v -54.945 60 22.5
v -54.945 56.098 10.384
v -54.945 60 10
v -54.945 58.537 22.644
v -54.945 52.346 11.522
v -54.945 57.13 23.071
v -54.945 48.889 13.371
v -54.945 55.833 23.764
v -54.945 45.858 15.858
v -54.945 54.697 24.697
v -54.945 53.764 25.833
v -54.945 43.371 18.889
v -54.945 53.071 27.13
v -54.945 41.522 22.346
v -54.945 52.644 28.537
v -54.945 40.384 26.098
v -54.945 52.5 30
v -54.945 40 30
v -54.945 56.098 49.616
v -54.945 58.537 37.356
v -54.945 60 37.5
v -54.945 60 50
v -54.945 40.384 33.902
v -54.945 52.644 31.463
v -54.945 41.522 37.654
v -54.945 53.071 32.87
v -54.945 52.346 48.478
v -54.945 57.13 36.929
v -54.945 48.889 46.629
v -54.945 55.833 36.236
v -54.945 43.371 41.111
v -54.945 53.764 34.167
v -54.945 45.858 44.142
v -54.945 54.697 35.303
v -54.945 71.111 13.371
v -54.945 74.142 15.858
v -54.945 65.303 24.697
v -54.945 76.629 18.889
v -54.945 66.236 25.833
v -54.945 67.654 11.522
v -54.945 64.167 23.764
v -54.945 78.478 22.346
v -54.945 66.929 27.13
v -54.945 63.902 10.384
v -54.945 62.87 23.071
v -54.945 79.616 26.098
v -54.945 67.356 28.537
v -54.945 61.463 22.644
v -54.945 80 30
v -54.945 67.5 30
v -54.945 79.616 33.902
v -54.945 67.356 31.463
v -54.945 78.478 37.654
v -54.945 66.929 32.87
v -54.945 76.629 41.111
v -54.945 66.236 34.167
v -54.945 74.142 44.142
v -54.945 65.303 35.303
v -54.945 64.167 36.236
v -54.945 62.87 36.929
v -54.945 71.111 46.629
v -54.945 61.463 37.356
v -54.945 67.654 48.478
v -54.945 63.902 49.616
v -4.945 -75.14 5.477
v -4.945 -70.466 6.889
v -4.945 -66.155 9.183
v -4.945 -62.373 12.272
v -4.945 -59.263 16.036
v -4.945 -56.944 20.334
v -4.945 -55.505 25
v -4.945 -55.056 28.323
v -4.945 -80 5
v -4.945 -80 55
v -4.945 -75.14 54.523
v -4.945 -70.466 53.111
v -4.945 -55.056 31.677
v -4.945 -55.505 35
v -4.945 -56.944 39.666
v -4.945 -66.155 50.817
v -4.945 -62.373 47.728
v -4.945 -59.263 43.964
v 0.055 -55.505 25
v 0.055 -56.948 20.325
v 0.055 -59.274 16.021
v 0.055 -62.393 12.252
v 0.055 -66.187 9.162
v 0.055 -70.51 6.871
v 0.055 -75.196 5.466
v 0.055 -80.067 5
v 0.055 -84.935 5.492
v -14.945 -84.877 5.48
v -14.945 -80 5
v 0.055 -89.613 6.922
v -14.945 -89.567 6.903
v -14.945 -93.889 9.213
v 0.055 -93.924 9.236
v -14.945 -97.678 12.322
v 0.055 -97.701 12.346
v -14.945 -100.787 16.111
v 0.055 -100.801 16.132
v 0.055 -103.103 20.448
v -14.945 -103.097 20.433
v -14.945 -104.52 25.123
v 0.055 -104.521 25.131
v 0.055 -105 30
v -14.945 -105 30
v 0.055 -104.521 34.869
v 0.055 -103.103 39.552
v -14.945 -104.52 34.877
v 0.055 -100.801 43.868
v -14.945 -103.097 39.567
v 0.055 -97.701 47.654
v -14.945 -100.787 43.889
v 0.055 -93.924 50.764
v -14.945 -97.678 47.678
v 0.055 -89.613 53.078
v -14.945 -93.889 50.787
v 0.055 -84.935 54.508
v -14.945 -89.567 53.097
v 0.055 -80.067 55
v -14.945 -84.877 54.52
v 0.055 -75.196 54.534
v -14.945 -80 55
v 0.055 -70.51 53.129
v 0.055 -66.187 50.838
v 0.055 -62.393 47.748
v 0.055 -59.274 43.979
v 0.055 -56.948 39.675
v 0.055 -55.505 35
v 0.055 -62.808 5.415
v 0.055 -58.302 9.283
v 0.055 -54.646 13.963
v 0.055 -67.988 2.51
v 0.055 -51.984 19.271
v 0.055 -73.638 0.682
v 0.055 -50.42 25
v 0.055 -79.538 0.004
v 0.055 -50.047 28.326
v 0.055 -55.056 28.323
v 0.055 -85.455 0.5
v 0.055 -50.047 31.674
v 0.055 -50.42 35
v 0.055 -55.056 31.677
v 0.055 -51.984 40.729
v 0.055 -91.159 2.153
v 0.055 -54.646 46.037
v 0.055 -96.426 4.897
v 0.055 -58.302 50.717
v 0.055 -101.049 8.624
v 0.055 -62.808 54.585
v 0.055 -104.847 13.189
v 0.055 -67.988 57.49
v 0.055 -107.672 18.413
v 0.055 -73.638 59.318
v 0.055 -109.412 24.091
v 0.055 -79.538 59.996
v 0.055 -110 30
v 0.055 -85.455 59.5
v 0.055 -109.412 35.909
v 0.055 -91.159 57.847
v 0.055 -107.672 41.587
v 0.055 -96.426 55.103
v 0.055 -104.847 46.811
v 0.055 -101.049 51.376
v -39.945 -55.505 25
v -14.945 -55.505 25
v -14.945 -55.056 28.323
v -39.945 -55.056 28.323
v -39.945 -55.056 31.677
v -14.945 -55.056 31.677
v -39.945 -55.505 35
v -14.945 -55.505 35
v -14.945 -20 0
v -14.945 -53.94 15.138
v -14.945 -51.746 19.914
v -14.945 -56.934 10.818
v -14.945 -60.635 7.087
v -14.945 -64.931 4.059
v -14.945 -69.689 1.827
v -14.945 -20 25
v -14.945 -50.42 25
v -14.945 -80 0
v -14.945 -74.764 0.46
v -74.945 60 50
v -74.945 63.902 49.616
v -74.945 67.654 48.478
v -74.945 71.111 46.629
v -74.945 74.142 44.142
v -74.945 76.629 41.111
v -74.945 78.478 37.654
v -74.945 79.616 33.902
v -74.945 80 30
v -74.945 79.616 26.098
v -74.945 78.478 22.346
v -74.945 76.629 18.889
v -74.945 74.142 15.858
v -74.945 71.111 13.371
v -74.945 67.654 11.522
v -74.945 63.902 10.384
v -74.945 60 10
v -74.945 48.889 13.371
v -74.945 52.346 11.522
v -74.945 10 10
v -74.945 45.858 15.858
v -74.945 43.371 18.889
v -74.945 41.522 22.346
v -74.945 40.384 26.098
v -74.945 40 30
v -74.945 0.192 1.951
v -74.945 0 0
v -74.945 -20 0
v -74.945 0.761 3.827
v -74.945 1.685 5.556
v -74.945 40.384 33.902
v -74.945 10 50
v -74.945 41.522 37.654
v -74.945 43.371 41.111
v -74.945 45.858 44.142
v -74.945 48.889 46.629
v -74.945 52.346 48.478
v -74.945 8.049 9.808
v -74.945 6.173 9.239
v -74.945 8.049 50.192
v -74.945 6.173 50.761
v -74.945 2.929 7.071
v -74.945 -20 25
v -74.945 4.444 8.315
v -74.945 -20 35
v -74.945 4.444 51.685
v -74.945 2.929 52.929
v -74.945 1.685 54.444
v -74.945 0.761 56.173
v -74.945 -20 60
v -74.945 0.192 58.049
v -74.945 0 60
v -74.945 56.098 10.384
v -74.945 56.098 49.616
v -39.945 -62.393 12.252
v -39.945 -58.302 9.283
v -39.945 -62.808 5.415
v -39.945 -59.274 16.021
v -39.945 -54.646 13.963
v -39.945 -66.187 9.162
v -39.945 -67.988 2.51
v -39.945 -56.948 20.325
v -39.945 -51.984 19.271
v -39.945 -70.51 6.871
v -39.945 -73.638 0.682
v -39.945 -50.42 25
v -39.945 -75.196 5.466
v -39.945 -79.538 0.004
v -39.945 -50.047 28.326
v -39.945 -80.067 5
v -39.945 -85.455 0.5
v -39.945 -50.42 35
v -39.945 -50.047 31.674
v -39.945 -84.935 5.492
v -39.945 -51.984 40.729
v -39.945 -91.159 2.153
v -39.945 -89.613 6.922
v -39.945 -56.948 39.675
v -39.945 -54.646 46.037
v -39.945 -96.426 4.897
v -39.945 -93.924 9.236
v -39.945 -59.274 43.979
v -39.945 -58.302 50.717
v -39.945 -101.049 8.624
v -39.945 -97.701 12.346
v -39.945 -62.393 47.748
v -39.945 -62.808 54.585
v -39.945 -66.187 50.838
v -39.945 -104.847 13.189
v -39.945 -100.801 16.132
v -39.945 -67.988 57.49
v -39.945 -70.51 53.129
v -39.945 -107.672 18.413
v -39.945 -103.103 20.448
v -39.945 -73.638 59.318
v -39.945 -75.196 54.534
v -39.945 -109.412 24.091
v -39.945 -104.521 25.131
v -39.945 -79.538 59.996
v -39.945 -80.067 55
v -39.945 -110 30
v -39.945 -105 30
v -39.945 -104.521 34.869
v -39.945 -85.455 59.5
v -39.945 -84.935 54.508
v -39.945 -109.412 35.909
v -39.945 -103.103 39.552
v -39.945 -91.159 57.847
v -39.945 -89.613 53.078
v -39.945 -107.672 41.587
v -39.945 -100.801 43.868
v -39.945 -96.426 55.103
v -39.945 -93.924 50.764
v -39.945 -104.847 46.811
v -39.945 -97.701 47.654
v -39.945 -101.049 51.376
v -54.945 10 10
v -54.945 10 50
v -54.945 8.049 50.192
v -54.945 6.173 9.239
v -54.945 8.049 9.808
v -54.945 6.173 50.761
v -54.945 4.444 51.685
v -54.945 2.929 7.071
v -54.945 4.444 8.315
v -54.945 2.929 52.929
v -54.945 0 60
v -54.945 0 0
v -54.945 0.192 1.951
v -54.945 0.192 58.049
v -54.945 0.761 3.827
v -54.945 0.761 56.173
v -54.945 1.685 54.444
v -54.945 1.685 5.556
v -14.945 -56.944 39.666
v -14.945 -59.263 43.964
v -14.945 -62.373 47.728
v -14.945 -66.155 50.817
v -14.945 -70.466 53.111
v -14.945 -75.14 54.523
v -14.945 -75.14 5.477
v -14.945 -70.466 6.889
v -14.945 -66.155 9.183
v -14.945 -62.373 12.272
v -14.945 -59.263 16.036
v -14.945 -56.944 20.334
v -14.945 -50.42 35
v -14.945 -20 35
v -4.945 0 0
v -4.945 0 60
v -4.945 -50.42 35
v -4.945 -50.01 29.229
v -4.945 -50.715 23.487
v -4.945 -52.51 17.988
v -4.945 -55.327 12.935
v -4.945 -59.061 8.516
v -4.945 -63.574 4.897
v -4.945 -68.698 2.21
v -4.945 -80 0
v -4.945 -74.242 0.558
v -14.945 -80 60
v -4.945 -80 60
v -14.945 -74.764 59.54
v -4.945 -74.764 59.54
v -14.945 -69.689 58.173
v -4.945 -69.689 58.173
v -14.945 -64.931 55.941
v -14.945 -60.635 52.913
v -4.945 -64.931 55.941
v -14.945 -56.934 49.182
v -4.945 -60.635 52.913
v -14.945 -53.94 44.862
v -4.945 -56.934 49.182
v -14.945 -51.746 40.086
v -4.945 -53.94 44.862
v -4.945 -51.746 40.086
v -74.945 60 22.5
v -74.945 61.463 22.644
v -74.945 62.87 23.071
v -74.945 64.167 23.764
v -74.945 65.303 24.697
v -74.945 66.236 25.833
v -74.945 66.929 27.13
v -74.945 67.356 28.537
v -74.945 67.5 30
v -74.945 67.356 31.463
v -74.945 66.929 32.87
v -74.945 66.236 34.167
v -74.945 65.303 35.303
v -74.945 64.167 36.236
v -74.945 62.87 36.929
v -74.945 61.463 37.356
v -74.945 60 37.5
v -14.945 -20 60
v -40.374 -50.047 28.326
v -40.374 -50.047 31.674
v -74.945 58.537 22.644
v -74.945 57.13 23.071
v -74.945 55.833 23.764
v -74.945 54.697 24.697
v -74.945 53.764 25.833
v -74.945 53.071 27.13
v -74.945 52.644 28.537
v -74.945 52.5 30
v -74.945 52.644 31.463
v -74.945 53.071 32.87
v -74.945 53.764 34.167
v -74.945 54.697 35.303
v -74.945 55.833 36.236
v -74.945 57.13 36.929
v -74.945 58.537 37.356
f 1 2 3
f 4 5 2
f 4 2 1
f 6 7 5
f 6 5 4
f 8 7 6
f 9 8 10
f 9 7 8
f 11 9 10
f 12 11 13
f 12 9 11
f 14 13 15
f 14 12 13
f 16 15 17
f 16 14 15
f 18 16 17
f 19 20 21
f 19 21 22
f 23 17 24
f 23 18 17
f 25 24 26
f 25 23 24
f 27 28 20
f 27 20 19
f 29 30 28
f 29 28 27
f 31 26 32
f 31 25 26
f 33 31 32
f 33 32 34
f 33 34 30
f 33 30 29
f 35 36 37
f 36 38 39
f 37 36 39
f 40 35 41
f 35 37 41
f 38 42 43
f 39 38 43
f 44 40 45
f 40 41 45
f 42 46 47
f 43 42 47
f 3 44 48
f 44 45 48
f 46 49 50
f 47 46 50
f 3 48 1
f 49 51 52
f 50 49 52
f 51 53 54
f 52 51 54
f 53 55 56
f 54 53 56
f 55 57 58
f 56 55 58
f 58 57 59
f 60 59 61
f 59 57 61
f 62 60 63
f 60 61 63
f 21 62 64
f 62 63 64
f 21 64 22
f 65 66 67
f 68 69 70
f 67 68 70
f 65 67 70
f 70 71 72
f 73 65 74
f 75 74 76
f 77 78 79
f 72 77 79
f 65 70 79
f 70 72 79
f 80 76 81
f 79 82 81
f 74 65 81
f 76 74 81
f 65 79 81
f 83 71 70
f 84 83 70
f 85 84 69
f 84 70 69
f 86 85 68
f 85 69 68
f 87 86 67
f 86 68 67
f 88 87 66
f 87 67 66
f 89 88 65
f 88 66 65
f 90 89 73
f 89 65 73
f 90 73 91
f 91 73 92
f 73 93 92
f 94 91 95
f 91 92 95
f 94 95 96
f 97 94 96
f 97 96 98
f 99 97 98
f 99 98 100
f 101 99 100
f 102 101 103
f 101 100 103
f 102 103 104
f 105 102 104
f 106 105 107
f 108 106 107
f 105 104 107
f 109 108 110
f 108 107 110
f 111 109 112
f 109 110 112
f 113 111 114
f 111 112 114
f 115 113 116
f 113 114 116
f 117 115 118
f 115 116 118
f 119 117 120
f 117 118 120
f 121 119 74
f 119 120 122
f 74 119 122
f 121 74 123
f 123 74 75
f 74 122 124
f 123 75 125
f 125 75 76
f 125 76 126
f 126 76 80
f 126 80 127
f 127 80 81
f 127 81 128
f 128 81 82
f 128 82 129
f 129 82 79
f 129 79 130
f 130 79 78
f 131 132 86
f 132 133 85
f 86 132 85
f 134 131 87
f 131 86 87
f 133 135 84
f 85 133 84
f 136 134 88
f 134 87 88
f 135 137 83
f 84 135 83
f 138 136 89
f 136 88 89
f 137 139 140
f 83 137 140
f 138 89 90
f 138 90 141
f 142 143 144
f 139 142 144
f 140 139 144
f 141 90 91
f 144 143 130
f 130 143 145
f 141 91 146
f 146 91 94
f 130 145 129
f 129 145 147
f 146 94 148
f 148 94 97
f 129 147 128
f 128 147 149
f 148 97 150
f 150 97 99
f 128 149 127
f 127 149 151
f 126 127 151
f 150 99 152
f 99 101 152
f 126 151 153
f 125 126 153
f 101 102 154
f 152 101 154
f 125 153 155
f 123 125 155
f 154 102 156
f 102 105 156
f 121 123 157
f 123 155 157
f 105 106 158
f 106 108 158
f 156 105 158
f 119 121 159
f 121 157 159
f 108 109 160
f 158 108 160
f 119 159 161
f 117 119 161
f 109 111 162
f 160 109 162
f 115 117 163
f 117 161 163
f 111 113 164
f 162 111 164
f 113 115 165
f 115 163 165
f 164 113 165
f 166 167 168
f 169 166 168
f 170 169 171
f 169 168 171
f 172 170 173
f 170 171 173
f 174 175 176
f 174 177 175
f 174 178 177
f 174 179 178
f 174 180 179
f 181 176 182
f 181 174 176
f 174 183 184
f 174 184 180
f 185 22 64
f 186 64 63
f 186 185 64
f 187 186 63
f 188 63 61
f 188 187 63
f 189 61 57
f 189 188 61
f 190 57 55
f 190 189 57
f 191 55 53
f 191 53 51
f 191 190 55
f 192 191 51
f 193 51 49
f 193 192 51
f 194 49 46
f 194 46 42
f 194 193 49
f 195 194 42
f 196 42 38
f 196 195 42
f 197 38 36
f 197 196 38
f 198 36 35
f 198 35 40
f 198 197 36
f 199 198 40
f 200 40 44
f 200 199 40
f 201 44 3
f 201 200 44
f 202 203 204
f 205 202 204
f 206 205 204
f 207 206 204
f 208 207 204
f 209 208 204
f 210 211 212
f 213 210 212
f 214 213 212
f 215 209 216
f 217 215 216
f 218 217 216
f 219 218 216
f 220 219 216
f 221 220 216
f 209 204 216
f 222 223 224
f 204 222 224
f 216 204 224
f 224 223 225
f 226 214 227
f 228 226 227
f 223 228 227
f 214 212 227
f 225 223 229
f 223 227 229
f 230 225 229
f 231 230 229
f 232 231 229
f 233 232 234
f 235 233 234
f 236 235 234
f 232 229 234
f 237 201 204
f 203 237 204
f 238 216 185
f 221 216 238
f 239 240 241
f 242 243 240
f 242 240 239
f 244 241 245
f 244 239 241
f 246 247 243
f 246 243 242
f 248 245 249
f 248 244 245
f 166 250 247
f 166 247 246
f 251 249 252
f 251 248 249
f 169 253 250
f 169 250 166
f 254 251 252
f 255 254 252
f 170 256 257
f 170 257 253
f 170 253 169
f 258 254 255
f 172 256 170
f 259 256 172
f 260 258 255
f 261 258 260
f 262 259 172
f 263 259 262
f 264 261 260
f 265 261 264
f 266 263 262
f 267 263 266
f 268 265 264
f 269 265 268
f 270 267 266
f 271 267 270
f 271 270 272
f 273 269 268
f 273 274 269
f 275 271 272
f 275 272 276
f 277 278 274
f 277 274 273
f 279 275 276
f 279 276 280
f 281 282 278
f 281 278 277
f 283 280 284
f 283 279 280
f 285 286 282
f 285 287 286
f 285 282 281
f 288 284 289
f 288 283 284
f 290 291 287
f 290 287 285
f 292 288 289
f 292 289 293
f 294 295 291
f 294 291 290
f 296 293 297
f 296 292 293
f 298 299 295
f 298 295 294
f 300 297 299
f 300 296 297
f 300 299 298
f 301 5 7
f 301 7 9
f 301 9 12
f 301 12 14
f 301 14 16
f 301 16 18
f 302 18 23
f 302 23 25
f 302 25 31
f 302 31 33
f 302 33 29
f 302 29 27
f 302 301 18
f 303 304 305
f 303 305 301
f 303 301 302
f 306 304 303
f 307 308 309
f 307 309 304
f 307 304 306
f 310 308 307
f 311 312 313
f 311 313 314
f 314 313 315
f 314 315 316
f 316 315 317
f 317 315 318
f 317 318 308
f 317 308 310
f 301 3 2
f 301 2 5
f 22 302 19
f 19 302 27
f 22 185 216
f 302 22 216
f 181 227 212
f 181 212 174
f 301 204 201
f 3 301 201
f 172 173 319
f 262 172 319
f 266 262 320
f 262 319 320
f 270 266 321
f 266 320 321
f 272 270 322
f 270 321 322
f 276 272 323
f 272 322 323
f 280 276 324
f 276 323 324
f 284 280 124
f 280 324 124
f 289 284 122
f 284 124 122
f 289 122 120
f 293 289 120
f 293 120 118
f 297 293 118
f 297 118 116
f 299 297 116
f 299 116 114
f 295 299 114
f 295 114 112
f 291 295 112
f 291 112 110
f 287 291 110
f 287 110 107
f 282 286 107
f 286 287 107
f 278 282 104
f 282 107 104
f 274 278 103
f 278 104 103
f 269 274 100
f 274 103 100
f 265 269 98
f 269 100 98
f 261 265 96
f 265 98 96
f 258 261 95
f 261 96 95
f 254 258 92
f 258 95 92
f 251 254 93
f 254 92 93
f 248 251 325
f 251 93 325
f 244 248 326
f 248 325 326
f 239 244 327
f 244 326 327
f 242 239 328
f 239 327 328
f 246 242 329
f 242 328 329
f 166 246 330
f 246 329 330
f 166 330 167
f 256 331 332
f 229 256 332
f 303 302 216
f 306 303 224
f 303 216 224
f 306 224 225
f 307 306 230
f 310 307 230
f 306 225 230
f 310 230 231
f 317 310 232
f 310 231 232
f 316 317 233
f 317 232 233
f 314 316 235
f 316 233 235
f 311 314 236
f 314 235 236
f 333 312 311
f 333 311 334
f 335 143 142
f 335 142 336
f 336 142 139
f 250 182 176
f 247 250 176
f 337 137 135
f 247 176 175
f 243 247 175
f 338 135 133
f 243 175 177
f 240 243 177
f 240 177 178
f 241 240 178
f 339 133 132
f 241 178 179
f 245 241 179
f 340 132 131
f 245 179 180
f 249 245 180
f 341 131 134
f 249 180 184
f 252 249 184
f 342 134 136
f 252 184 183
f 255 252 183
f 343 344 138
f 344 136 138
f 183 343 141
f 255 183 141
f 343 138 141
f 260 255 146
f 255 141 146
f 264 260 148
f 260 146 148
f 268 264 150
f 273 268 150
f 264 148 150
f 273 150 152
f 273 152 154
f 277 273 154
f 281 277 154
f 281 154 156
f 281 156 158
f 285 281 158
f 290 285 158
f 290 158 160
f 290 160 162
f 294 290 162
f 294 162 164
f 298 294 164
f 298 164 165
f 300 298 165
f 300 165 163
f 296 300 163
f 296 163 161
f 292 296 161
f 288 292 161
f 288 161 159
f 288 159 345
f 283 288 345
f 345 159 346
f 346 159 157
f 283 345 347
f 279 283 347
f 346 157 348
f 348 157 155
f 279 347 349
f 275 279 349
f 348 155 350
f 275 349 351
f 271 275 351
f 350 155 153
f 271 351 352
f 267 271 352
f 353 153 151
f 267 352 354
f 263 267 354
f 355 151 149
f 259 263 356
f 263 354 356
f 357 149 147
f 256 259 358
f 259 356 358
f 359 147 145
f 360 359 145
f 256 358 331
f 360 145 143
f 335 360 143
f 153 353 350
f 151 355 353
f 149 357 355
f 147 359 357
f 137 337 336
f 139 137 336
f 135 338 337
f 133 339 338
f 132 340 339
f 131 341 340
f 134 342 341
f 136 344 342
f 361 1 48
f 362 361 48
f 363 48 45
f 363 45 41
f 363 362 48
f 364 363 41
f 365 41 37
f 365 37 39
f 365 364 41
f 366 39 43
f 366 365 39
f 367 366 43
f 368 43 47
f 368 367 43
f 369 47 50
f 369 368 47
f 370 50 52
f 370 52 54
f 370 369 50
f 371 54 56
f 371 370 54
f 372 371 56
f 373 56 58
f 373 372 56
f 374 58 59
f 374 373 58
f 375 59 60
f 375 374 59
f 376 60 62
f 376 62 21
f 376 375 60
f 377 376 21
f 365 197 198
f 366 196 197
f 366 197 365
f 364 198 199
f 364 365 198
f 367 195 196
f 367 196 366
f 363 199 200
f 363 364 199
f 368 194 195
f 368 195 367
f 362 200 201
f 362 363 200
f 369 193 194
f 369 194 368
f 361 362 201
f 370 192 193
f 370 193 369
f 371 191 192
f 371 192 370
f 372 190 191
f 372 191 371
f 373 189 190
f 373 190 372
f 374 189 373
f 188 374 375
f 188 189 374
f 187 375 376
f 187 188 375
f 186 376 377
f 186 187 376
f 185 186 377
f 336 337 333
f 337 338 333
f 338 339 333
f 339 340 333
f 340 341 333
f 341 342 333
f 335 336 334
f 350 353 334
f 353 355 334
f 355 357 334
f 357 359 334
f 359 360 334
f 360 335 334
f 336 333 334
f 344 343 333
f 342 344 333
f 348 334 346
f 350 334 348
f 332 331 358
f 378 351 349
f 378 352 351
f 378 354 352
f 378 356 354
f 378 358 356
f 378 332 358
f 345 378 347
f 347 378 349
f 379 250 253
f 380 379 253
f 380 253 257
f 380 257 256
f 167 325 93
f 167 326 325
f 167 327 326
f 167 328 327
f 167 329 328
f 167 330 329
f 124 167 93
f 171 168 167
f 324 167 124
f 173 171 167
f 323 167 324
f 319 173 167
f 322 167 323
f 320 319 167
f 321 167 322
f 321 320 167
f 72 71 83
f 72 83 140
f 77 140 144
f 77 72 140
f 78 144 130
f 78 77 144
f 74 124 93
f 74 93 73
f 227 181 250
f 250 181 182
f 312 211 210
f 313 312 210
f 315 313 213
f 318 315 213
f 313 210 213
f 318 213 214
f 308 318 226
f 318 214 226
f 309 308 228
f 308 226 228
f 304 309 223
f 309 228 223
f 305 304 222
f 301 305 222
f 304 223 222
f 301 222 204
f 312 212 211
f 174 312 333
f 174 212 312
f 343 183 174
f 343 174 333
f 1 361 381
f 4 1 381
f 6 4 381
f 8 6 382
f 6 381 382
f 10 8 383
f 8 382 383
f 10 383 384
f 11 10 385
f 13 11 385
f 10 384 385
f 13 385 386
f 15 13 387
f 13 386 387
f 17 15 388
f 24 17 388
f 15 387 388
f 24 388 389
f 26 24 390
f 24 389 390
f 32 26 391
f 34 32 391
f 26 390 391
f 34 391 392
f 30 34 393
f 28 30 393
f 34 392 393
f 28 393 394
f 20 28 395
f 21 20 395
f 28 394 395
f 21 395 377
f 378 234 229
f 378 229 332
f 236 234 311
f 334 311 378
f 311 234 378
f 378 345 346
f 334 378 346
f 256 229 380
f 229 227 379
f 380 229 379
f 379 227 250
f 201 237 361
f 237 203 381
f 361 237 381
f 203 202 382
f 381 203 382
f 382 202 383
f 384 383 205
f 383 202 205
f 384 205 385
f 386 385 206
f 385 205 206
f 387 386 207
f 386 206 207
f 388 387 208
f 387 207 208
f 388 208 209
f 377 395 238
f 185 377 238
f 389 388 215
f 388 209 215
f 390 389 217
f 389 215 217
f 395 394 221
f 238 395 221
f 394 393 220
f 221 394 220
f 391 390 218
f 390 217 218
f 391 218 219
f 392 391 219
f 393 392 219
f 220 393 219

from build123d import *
from build123d import SkipClean  # not in build123d's __all__

# Parameters (mm, degrees)
F0_W      = 70
F0_H      = 60
F8_DEPTH  = 20
F1_W      = 10
F1_H      = 60
F9_DEPTH  = 60
F10_DEPTH = 25
F3_DEPTH  = 40
F4_DEPTH  = 60
F11_DEPTH = 109.889773652
F6_W      = 20
F6_H      = 60
F12_DEPTH = 60
F14_DEPTH = 25
F7_DEPTH  = 20


with BuildPart() as f8:
    # F0 (on Front) → F8 (new body)
    with BuildSketch(Plane.XZ):
        with Locations((-39.945468749, 30)):
            Rectangle(F0_W, F0_H)
    extrude(amount=F8_DEPTH)

    # F1 (on face) → F9 (join)
    with BuildSketch(Plane.XZ.offset(20)):
        with Locations((-9.945468749, 30)):
            Rectangle(F1_W, F1_H)
    extrude(amount=F9_DEPTH)

    # F2 (on face) → F10 (join)
    with BuildSketch(Plane(origin=(-14.945468749, 0, 0), x_dir=(0, -1, 0), z_dir=(-1, 0, 0))):
        with BuildLine():
            Line((55.5051025722, 35), (50.4196010845, 35))
            ThreePointArc((50.4196010845, 35), (50, 30), (50.4196010845, 25))
            Line((50.4196010845, 25), (55.5051025722, 25))
            ThreePointArc((55.5051025722, 25), (55, 30), (55.5051025722, 35))
        make_face()
        with BuildLine():
            Line((55.5051025722, 25), (50.4196010845, 25))
            ThreePointArc((50.4196010845, 25), (60.635083269, 7.0871215252), (80, 0))
            Line((80, 0), (80, 5))
            ThreePointArc((80, 5), (64.1886116992, 10.635083269), (55.5051025722, 25))
        make_face()
        with BuildLine():
            ThreePointArc((80, 60), (60.635083269, 52.9128784748), (50.4196010845, 35))
            Line((50.4196010845, 35), (55.5051025722, 35))
            ThreePointArc((55.5051025722, 35), (64.1886116992, 49.364916731), (80, 55))
            Line((80, 55), (80, 60))
        make_face()
        with BuildLine():
            ThreePointArc((110, 30), (101.2132034356, 51.2132034356), (80, 60))
            Line((80, 60), (80, 55))
            ThreePointArc((80, 55), (97.6776695297, 47.6776695297), (105, 30))
            ThreePointArc((105, 30), (97.6776695297, 12.3223304703), (80, 5))
            Line((80, 5), (80, 0))
            ThreePointArc((80, 0), (101.2132034356, 8.7867965644), (110, 30))
        make_face()
    extrude(amount=F10_DEPTH)

    # F3 (add): a face of the model
    f3_faces = [f8.faces().sort_by_distance(p)[0] for p in [
        (-39.945468749, -80, 4.1514718626),
    ]]
    extrude(f3_faces, amount=-F3_DEPTH)

    # F2 (on face) → F4 (join)
    with BuildSketch(Plane(origin=(-14.945468749, 0, 0), x_dir=(0, -1, 0), z_dir=(-1, 0, 0))):
        with BuildLine():
            Line((50.4196010845, 35), (20, 35))
            Line((20, 35), (20, 25))
            Line((20, 25), (50.4196010845, 25))
            ThreePointArc((50.4196010845, 25), (50, 30), (50.4196010845, 35))
        make_face()
    extrude(amount=F4_DEPTH)

    # F5 (on face) → F11 (cut)
    with BuildSketch(Plane(origin=(0, 0, 25), x_dir=(1, 0, 0), z_dir=(0, 0, -1))):
        Polygon((-74.945468749, 50.4196010845), (-74.945468749, 20), (-39.945468749, 50.4196010845), align=None)
    extrude(amount=-F11_DEPTH, mode=Mode.SUBTRACT)

    # F6 (on face) → F12 (join)
    with BuildSketch(Plane.XZ):
        with Locations((-64.945468749, 30)):
            Rectangle(F6_W, F6_H)
    extrude(amount=-F12_DEPTH)

    # F13 (on face) → F14 (cut)
    with BuildSketch(Plane(origin=(-74.945468749, 0, 0), x_dir=(0, -1, 0), z_dir=(-1, 0, 0))):
        with BuildLine():
            Line((0, 60), (-20, 60))
            ThreePointArc((-20, 60), (-17.0710678119, 52.9289321881), (-10, 50))
            ThreePointArc((-10, 50), (-2.9289321881, 52.9289321881), (0, 60))
        make_face()
        with BuildLine():
            Line((-10, 10), (-60, 10))
            Line((-60, 10), (-60, 0))
            Line((-60, 0), (-20, 0))
            ThreePointArc((-20, 0), (-17.0710678119, 7.0710678119), (-10, 10))
        make_face()
        with BuildLine():
            ThreePointArc((0, 0), (-2.9289321881, 7.0710678119), (-10, 10))
            ThreePointArc((-10, 10), (-17.0710678119, 7.0710678119), (-20, 0))
            Line((-20, 0), (0, 0))
        make_face()
        with BuildLine():
            ThreePointArc((-10, 50), (-17.0710678119, 52.9289321881), (-20, 60))
            Line((-20, 60), (-60, 60))
            Line((-60, 60), (-60, 50))
            Line((-60, 50), (-10, 50))
        make_face()
        with BuildLine():
            ThreePointArc((-52.5, 30), (-54.6966991411, 35.3033008589), (-60, 37.5))
            Line((-60, 37.5), (-60, 22.5))
            ThreePointArc((-60, 22.5), (-54.6966991411, 24.6966991411), (-52.5, 30))
        make_face()
    extrude(amount=-F14_DEPTH, mode=Mode.SUBTRACT)

    # F13 (on face) → F7 (join)
    with BuildSketch(Plane(origin=(-74.945468749, 0, 0), x_dir=(0, -1, 0), z_dir=(-1, 0, 0))):
        with BuildLine():
            Line((-60, 37.5), (-60, 50))
            ThreePointArc((-60, 50), (-80, 30), (-60, 10))
            Line((-60, 10), (-60, 22.5))
            ThreePointArc((-60, 22.5), (-67.5, 30), (-60, 37.5))
        make_face()
        with BuildLine():
            ThreePointArc((-40, 30), (-45.8578643763, 44.1421356237), (-60, 50))
            Line((-60, 50), (-60, 37.5))
            ThreePointArc((-60, 37.5), (-54.6966991411, 35.3033008589), (-52.5, 30))
            ThreePointArc((-52.5, 30), (-54.6966991411, 24.6966991411), (-60, 22.5))
            Line((-60, 22.5), (-60, 10))
            ThreePointArc((-60, 10), (-45.8578643763, 15.8578643763), (-40, 30))
        make_face()
    with SkipClean():  # cleaning this boolean's faces spoils the solid; the shape is the same uncleaned
        extrude(amount=-F7_DEPTH)


solid = f8.part
